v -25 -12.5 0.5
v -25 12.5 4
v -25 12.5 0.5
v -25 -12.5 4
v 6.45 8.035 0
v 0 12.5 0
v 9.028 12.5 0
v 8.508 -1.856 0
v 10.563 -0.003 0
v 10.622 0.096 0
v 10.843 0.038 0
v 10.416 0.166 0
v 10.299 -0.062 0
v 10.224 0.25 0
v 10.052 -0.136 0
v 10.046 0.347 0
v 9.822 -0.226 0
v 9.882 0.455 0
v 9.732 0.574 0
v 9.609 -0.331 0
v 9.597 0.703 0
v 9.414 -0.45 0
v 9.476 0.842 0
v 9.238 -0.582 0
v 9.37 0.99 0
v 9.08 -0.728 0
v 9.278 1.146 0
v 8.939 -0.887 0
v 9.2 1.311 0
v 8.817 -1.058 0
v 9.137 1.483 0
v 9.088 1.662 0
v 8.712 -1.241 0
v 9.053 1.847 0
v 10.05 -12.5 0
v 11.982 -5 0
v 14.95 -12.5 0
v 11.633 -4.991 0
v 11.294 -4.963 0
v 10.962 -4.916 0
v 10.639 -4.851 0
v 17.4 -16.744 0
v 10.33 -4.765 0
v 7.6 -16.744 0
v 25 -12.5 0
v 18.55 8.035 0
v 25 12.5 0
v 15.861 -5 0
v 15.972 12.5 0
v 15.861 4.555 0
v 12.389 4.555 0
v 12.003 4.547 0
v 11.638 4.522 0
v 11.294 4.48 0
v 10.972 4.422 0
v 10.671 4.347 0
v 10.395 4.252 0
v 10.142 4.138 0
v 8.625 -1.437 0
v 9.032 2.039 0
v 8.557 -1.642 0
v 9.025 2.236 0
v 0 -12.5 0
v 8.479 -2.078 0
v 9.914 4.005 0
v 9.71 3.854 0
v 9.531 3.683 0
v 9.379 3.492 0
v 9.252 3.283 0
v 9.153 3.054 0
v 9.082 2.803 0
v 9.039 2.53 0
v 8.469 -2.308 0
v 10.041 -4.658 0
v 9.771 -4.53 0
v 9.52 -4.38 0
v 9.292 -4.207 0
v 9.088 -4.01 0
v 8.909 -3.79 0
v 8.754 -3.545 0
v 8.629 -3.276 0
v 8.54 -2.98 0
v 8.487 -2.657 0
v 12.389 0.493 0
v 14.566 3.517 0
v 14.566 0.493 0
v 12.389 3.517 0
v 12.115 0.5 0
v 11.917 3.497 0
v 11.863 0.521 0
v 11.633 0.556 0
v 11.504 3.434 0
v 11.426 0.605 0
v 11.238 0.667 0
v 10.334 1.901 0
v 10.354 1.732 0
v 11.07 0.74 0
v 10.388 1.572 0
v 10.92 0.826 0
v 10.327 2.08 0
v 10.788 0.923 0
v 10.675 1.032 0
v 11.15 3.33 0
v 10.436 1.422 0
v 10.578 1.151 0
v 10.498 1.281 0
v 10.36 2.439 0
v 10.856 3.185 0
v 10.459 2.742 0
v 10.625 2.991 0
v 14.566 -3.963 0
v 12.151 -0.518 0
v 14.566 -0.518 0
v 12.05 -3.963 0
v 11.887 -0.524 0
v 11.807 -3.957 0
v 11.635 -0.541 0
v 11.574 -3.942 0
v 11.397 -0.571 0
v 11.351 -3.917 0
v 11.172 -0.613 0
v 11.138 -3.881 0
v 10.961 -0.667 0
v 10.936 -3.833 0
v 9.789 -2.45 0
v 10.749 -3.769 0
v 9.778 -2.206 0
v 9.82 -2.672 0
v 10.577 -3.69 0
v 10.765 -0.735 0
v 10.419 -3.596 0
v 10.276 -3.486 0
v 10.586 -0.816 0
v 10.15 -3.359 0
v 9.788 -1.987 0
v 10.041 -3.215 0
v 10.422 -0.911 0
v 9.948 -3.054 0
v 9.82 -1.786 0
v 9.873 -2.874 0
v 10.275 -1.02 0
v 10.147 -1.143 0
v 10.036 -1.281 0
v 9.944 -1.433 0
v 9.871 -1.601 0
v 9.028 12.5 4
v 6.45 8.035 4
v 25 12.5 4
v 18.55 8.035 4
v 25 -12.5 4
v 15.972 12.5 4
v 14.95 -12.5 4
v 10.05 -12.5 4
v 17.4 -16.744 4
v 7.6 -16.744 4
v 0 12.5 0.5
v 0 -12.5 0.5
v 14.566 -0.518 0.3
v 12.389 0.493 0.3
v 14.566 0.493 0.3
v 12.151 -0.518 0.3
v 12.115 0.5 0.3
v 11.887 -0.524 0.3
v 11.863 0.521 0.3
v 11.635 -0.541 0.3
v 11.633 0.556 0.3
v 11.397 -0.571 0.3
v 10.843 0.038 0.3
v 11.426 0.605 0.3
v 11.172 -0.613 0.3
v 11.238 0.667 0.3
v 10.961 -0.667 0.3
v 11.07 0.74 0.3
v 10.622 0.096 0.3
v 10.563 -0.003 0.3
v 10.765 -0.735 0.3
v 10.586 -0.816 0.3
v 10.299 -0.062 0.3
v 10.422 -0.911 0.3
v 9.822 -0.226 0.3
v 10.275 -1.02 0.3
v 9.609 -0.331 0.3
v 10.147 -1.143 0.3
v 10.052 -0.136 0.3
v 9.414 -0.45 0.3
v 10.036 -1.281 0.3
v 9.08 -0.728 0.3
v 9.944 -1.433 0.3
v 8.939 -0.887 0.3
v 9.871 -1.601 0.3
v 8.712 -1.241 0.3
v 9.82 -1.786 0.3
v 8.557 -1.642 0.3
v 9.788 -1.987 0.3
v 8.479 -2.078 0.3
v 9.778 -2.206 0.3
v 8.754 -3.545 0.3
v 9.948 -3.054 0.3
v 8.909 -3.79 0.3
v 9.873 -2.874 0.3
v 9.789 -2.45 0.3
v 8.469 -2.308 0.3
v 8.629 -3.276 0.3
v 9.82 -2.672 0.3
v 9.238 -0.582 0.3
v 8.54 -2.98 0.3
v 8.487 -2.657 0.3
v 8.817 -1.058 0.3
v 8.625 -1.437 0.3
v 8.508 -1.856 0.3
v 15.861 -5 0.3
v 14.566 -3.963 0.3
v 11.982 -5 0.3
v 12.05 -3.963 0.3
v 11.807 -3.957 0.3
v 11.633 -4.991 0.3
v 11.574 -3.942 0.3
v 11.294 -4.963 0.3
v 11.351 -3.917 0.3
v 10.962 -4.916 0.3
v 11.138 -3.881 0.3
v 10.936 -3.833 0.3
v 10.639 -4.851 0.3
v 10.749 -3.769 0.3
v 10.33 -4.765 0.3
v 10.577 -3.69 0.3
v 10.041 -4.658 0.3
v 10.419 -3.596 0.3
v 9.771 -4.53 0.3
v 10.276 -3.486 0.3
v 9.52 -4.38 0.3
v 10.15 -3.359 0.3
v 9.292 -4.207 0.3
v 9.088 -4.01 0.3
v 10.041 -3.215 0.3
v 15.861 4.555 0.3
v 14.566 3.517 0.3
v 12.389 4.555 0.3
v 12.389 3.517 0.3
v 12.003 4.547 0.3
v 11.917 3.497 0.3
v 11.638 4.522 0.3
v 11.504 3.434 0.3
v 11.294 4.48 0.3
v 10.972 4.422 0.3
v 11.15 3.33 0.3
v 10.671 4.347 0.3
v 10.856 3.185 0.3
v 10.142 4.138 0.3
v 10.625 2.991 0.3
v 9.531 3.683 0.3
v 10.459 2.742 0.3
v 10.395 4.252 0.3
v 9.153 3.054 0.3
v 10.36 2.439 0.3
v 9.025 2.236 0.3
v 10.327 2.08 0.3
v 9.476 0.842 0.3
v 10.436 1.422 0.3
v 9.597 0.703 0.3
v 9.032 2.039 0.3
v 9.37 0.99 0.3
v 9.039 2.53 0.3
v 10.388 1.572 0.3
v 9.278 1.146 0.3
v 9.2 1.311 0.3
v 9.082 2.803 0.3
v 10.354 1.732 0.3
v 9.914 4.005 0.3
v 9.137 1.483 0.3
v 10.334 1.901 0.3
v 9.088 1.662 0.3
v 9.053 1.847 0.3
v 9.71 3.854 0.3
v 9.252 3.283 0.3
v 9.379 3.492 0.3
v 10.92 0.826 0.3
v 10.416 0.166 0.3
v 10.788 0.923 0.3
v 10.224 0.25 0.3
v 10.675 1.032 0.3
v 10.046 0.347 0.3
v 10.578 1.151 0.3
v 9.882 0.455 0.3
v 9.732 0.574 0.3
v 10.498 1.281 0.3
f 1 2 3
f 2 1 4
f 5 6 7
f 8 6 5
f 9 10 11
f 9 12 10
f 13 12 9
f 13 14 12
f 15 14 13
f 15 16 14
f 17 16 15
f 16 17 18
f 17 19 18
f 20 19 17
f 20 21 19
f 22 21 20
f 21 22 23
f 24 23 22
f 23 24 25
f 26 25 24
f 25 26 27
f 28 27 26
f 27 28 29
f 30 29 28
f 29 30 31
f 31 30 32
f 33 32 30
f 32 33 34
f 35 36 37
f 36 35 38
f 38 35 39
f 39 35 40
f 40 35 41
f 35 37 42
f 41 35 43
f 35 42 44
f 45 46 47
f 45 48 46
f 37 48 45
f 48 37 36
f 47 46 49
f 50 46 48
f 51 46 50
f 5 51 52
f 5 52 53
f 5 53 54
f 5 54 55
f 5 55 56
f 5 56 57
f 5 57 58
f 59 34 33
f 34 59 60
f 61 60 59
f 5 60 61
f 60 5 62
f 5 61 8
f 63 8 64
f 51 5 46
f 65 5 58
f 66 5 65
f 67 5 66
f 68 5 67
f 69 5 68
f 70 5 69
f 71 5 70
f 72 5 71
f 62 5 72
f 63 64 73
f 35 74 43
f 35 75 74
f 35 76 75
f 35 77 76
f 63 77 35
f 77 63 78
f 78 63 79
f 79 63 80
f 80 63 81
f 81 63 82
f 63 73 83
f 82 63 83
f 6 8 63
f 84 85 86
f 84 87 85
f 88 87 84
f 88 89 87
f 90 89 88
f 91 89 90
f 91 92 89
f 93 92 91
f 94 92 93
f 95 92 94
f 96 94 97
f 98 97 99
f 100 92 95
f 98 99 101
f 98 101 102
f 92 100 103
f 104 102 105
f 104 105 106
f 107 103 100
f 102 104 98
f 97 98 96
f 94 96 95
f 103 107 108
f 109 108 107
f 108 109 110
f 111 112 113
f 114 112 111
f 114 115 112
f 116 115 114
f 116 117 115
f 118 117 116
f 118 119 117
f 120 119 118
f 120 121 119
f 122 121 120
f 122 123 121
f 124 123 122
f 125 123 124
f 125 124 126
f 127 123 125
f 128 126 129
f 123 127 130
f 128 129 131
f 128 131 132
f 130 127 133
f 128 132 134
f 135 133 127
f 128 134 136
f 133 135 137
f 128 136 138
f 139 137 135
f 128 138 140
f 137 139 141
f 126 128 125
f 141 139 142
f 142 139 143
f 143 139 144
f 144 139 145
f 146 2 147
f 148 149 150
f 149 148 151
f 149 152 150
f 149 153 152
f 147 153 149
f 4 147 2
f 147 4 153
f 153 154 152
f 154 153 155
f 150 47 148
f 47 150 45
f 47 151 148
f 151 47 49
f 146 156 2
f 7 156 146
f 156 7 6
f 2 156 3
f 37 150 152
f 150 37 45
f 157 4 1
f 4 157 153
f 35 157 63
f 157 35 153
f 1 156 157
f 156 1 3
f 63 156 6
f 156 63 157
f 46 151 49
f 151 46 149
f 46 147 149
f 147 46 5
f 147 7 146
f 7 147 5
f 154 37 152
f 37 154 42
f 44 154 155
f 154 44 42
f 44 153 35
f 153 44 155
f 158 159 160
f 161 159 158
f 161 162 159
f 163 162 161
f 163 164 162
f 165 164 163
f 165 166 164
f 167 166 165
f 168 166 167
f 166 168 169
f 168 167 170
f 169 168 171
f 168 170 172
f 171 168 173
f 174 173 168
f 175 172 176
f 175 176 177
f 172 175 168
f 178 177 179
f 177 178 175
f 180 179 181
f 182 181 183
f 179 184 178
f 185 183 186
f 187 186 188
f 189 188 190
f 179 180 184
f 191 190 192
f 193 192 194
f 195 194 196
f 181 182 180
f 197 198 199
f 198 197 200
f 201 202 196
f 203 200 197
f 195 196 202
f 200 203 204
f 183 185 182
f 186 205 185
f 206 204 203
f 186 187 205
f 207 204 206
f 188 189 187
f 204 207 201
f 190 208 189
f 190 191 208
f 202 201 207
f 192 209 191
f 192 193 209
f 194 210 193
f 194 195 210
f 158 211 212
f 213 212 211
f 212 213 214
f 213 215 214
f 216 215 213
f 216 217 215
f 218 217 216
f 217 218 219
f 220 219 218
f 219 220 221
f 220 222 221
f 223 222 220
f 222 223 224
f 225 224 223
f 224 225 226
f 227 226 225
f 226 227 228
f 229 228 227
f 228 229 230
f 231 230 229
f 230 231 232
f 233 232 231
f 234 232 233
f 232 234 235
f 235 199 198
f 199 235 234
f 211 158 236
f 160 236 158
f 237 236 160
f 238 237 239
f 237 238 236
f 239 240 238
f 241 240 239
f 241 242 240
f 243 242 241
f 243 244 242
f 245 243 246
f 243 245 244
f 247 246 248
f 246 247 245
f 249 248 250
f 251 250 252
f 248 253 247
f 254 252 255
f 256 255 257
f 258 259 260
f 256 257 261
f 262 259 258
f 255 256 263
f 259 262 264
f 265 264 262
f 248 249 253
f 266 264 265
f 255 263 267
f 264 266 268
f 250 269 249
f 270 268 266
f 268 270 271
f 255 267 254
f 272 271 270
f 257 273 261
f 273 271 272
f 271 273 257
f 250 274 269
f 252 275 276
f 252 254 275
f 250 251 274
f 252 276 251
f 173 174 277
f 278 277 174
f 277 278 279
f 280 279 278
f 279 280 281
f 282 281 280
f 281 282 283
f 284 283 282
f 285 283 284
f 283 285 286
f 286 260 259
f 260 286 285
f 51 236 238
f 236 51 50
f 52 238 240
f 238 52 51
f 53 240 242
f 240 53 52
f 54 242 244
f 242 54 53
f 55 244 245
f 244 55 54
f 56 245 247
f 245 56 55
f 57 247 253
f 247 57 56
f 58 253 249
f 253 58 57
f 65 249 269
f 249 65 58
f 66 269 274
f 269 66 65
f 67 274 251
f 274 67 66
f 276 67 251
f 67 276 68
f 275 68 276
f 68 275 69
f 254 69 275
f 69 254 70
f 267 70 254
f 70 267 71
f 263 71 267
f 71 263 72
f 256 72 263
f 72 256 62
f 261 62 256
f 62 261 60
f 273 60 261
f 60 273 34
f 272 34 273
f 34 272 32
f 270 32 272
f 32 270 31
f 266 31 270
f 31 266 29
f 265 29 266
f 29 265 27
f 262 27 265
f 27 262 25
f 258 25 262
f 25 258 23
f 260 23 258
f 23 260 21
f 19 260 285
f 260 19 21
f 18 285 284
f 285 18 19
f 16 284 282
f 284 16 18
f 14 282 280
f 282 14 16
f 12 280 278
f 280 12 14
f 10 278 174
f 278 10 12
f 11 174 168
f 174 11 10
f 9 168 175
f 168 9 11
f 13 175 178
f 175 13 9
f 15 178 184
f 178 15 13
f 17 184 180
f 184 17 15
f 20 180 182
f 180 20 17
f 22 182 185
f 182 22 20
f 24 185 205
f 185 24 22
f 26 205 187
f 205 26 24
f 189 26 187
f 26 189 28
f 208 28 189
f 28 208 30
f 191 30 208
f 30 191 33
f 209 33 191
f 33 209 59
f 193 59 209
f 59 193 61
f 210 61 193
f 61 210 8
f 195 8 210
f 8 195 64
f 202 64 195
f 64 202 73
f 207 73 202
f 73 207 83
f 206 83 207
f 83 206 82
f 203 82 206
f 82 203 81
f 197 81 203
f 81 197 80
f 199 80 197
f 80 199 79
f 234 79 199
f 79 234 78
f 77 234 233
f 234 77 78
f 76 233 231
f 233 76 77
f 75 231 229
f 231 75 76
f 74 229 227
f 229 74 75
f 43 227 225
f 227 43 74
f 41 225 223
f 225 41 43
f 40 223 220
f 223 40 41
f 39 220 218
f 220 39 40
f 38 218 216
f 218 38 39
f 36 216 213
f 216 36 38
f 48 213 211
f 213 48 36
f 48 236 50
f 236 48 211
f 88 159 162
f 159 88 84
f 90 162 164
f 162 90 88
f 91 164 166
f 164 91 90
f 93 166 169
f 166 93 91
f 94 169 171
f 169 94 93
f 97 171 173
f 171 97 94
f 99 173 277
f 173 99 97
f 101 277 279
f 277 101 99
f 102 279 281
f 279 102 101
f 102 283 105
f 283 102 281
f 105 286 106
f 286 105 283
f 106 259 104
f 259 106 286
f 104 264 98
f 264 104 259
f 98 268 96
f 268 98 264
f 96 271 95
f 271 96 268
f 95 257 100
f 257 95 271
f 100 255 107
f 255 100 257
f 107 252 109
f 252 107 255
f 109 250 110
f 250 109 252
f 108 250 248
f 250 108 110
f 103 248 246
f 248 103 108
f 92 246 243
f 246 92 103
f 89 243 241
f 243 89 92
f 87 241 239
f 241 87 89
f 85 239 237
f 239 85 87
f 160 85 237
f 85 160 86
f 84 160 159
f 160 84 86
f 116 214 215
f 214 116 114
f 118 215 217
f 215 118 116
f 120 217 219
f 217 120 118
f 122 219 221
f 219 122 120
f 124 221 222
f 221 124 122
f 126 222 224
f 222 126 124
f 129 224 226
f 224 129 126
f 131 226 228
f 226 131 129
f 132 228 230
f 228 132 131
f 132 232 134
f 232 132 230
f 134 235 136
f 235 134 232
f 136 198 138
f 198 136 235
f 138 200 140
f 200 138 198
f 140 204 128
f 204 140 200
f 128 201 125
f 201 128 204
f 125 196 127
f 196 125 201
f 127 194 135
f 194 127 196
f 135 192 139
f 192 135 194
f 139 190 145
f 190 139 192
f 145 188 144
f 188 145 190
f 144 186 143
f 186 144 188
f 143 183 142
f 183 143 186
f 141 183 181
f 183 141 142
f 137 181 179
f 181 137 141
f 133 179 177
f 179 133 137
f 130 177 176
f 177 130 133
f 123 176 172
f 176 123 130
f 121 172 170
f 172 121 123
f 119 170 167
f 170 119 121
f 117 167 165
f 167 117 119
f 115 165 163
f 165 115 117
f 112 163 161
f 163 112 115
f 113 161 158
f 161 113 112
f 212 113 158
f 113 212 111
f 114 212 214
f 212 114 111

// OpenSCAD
// file: letras.scad
use <pecinhas_varias.scad>

//------------------letra A-------------------------
module letraA(){
    linear_extrude(height=0.3){
        rotate([0,180,0])
            translate([-17,-5,0.3])
            text("A");
    }
}
//-------------------------------------------------------
//------------------letra B-------------------------
module letraB(){
    linear_extrude(height=0.3){
        rotate([0,180,0])
            translate([-17,-5,0.3])
                text("B");
    }
}
//-------------------------------------------------------
//------------------letra C-------------------------
module letraC(){
    linear_extrude(height=0.3){
        rotate([0,180,0])
            translate([-17,-5,0.3])
            text("C");
    }
}
//-------------------------------------------------------
rotate([180,0,0]){
piece_A();
}

//letraA();
letraB();
//letraC();
// file: pecinhas_varias.scad
height = 3; // piece height in mm;
length = 50; // piece length in mm; do NOT change!
width = 25; // piece width in mm; do NOT change!
X=30; //valor usado para deslocar a figura
L=21; //medida do lado do quadrado a inserir
M=(L-1.2)/7;


module CubeQRfill(cordX, cordY, height, width, length){ 
    translate([-2.625,-9.9,0]){
        rotate([0,0,90]){
            if ((cordX<=6) && (cordX>=0) && (cordY<=6) && (cordY>=0)){    
                    difference(){
                            cube([L-1.2 , L-1.2, 0.3]);
                        translate([cordX*M-0.15,cordY*M,-1])
                            cube([M+0.35, M+0.35, 2*height]);
                    }    
            }
        }
    }
}



//..............NUMBERS..............
module piece_zero(){
    intersection(){
        CubeQRfill(1,1,height, width, length);
        CubeQRfill(2,1,height, width, length);
        CubeQRfill(3,1,height, width, length);
        CubeQRfill(4,1,height, width, length);
        CubeQRfill(5,1,height, width, length);
    }
}



module piece_one(){
    intersection(){
        CubeQRfill(1,1,height, width, length);
        CubeQRfill(2,1,height, width, length);
        CubeQRfill(3,1,height, width, length);
        CubeQRfill(4,1,height, width, length);
        CubeQRfill(5,1,height, width, length);
        CubeQRfill(5,3,height, width, length);
        CubeQRfill(5,4,height, width, length);
        CubeQRfill(5,5,height, width, length);
    }
}


module piece_nine(){
    intersection(){
        CubeQRfill(1,1,height, width, length);
        CubeQRfill(2,1,height, width, length);
        CubeQRfill(3,1,height, width, length);
        CubeQRfill(4,2,height, width, length);
        CubeQRfill(5,1,height, width, length);
        CubeQRfill(5,3,height, width, length);
        CubeQRfill(5,4,height, width, length);
        CubeQRfill(5,5,height, width, length);
        CubeQRfill(4,5,height, width, length);
    }
}



//..............LETERS...............
module piece_A(){
    intersection(){
        CubeQRfill(1, 1, height, width, length);
        CubeQRfill(2, 1, height, width, length);
        CubeQRfill(4, 1, height, width, length);
        CubeQRfill(5, 1, height, width, length);
        CubeQRfill(3, 2, height, width, length);
        CubeQRfill(2, 3, height, width, length);
        CubeQRfill(4, 3, height, width, length);
        CubeQRfill(2, 4, height, width, length);
        CubeQRfill(4, 4, height, width, length);
        CubeQRfill(2, 5, height, width, length);
        CubeQRfill(4, 5, height, width, length);
        CubeQRfill(3, 5, height, width, length);
    }
}

module piece_B(){
    intersection(){
        CubeQRfill(1, 1, height, width, length);
        CubeQRfill(2, 1, height, width, length);
        CubeQRfill(4, 1, height, width, length);
        CubeQRfill(5, 1, height, width, length);
        CubeQRfill(3, 2, height, width, length);
        CubeQRfill(2, 3, height, width, length);
        CubeQRfill(4, 3, height, width, length);
        CubeQRfill(2, 4, height, width, length);
        CubeQRfill(4, 4, height, width, length);
        CubeQRfill(2, 5, height, width, length);
        CubeQRfill(4, 5, height, width, length);
        CubeQRfill(3, 5, height, width, length);
        CubeQRfill(5, 5, height, width, length);
        CubeQRfill(5, 4, height, width, length);
        CubeQRfill(5, 3, height, width, length);
    }
}



module piece_Z(){
    intersection(){
        CubeQRfill(1, 1, height, width, length);
        CubeQRfill(2, 1, height, width, length);
        CubeQRfill(4, 2, height, width, length);
        CubeQRfill(5, 1, height, width, length);
        CubeQRfill(3, 2, height, width, length);
        CubeQRfill(2, 3, height, width, length);
        CubeQRfill(4, 3, height, width, length);
        CubeQRfill(2, 4, height, width, length);
        CubeQRfill(4, 4, height, width, length);
        CubeQRfill(2, 5, height, width, length);
        CubeQRfill(4, 4, height, width, length);
        CubeQRfill(3, 4, height, width, length);
        CubeQRfill(5, 5, height, width, length);
        CubeQRfill(5, 4, height, width, length);
        CubeQRfill(5, 3, height, width, length);
        CubeQRfill(3, 3, height, width, length);
    }
}

module piece_a(){
    intersection(){
        CubeQRfill(1, 1, height, width, length);
        CubeQRfill(2, 2, height, width, length);
        CubeQRfill(4, 1, height, width, length);
        CubeQRfill(5, 1, height, width, length);
        CubeQRfill(3, 1, height, width, length);
        CubeQRfill(4, 3, height, width, length);
        CubeQRfill(4, 4, height, width, length);
        CubeQRfill(2, 5, height, width, length);
        CubeQRfill(4, 5, height, width, length);
    }
}
module piece_b(){
    intersection(){
        CubeQRfill(1, 1, height, width, length);
        CubeQRfill(2, 2, height, width, length);
        CubeQRfill(4, 1, height, width, length);
        CubeQRfill(5, 1, height, width, length);
        CubeQRfill(3, 1, height, width, length);
        CubeQRfill(4, 3, height, width, length);
        CubeQRfill(4, 4, height, width, length);
        CubeQRfill(2, 5, height, width, length);
        CubeQRfill(4, 5, height, width, length);
        CubeQRfill(5, 3, height, width, length);
        CubeQRfill(5, 4, height, width, length);
        CubeQRfill(5, 5, height, width, length);
    }
}

module piece_z(){
    intersection(){
        CubeQRfill(1, 1, height, width, length);
        CubeQRfill(2, 2, height, width, length);
        CubeQRfill(4, 2, height, width, length);
        CubeQRfill(5, 1, height, width, length);
        CubeQRfill(3, 1, height, width, length);
        CubeQRfill(4, 3, height, width, length);
        CubeQRfill(3, 5, height, width, length);
        CubeQRfill(4, 4, height, width, length);
        CubeQRfill(2, 5, height, width, length);
        CubeQRfill(4, 4, height, width, length);
        CubeQRfill(3, 4, height, width, length);
        CubeQRfill(5, 5, height, width, length);
        CubeQRfill(5, 4, height, width, length);
        CubeQRfill(5, 3, height, width, length);
        CubeQRfill(3, 3, height, width, length);
    }
}

//piece_zero();
//piece_one();
//piece_nine();
piece_A();
//piece_B();
//piece_Z();
//piece_a();
//piece_b();
//piece_z();
// main file
spacing = 0.2; // spacing in mm, to make sure males fit females;
height = 4; // piece height in mm;
length = 50; // piece length in mm; do NOT change!
width = 25; // piece width in mm; do NOT change!
tab_small = 5; // length of the tabs on their smaller side in mm; do NOT change!
tab_large = 10; // length of the tabs on their larger side in mm; do NOT change!
X=30; //valor usado para deslocar a figura
L=21; //medida do lado do quadrado a inserir
s_len = (length/2-4)/7-0.5; //comprimento dos quadrados do QR
s_wid = (width-4)/7-0.5; //largura dos quadrados do QR
use <pecinhas_varias.scad>;
use <letras.scad>;



//-------------------PARTE CORRETA DO CODIGO---------------------//


//BASE DA PEÇA
module base(height, thickness = 0, safe = 0) {
    translate([0,0,10]){
        difference(){
            cube([length + thickness, width + thickness, height + safe], true);
            #translate([length/4 , 0, 1.75])
                cube([length/2, width, 0.5], true);
        }
    }
} 
//PARTE DA PEÇA EM QUE SE ENCAIXA
module female(height, thickness = 0) {
    rotate(90, [0, 0, 1]) 
        translate([(tab_large + spacing - 2 * thickness) * sqrt(3) / 4 - (tab_large + spacing - 2 * thickness) / sqrt(3) , 0, 0])         
            cylinder(height + 1, (tab_large + spacing + 1.9 - 2 * thickness) / sqrt(3), (tab_large + spacing + 1.9 /*1.5 funciona para branco e preto*/ - 2 * thickness) / sqrt(3), true, $fn = 3);
  
}
//PARTE DA PEÇA QUE ENCAIXA
module male(height, thickness = 0, safe = 0) {
    difference(){ 
        rotate(90, [0, 0, 1]) 
            translate([(tab_large - spacing+ 2 * thickness) * sqrt(3) / 4 - (tab_large - spacing + 2 *thickness) / sqrt(3) , 0, 0]){ 
                cylinder(height + safe, (tab_large - spacing + 2 * thickness) / sqrt(3) , (tab_large - spacing + 2 * thickness) / sqrt(3), true, $fn = 3);
            } 

                
    }
}
//PARTE DE CIMA DA PEÇA (VISTO DE CIMA)
module top(height, ind, thickness = 0) {
    translate([0,0,10]){
        //intersection(){
            translate([- length / 4 + ind * tab_small, width/2+0.5, 0]) 
                female(height, thickness);
    }
}
//PARTE DE BAIXO DA PEÇA (VISTO DE CIMA)
module bottom(height, ind, thickness = 0, safe = 0) {
    translate([0,0,10]){
        //intersection(){
            translate([- length / 4 + ind * tab_small, - width / 2 + thickness / 3, 0]) 
                male(height, thickness, safe);

    }
}
//PARTE DA ESQUERDA DA PEÇA (VISTO DE CIMA)
module left(height, thickness = 0) {
    translate([0,0,10]){
        //intersection(){
            translate([- length / 2 + thickness / 3-0.5, 0, 0]) rotate(90, [0, 0, 1]) 
                female(height, thickness);

    }
}
//PARTE DA DIREITA DA PEÇA (VISTO DE CIMA)
module right(height, thickness = 0, safe = 0) {
    translate([0,0,10]){
        difference(){
            translate([length / 2 - thickness / 3, 0, 0]) rotate(90, [0, 0, 1]) 
                male(height, thickness, safe);
                #translate([length/4 , 0, 1.75])
                    cube([length/2, width, 0.5], true);
        } 
    }
}
//CALCULO DA PEÇA CONSOANTE OS DADOS FORNECIDOS
module piece(top, bottom, left, right, top_ind, bottom_ind, height, thickness = 0, safe = 0) {
    union() {
        difference() {
            union() {
                difference() {
                    base(height, thickness, safe);
                    if (top) {
                        top(height, top_ind, thickness);
                    }
                }
                if (bottom) {
                    bottom(height, bottom_ind, thickness, safe);
                }        
            }
            if (left) {
                left(height, thickness);
            }
        }
        if(right) {
            right(height, thickness, safe);
        }
    }
}
//CALCULO DA POSIÇAO DE CADA PARTE DE CADA PEÇA
module piece_position(top, bottom, left, right, top_ind, bottom_ind, x, y, height, thickness = 0, safe = 0) {
    translate([x * tab_small, - y * width, 0]) {
        piece(top, bottom, left, right, top_ind, bottom_ind, height, thickness, safe);
    }
}


module one_piece() {
    piece(true, true, false, false, 0, 0, height);
}

module two_piece() {
    union() {
        piece(true, false, false, false, 0, 0, height);
        piece_position(false, true, false, true, -1, -1, 1, 1, height);
    }
}

module three_piece() {
    union() {
        union() {
            piece(true, false, false, false, 0, 0, height);    
            piece_position(false, false, false, true, -1, -1, 1, 1, height);
        }
        piece_position(false, true, false, true, -1, -1, 1, 2, height);
    }
}

module numeric_piece() {
    piece(false, false, true, true, 0, 0, height);
}

module control_piece() {
    piece(true, true, false, true, 0, 1, height);
}

module end_control_piece() {
    piece(true, true, false, false, 1, 0, height);
}

module else_piece() {
    piece(true, true, false, false, 1, 1, height);
}

module forever_piece() {
    piece(true, true, false, false, 0, 1, height);
}

module end_forever_piece() {
    piece(true, false, false, false, 1, 0, height);
}

module event_piece() {
    piece(false, true, false, false, 0, 0, height);
}
difference(){ //---usar para criar o orificio na peca-----------------
translate([0,0,12]){
rotate([0,180,0]){
//translate([0,0,height/2])
one_piece();
//two_piece();
//three_piece();
//numeric_piece();
//control_piece();
//end_control_piece();
//else_piece();
//forever_piece();
//end_forever_piece();
//event_piece();
}
}


//---Bloco principal--------------------
//---usar para pruduzir letra---------------------------
letraB();
//--------------------------------------





//---segundo bloco--------------------
translate([-5, - 1 * width, 0]){
//---usar para pruduzir letra---------------------------
letraB();
}
//--------------------------------------




//---terceiro bloco--------------------
translate([-5, - 2 * width, 0]){
//---usar para pruduzir letra---------------------------
letraB();
}
//--------------------------------------


}
